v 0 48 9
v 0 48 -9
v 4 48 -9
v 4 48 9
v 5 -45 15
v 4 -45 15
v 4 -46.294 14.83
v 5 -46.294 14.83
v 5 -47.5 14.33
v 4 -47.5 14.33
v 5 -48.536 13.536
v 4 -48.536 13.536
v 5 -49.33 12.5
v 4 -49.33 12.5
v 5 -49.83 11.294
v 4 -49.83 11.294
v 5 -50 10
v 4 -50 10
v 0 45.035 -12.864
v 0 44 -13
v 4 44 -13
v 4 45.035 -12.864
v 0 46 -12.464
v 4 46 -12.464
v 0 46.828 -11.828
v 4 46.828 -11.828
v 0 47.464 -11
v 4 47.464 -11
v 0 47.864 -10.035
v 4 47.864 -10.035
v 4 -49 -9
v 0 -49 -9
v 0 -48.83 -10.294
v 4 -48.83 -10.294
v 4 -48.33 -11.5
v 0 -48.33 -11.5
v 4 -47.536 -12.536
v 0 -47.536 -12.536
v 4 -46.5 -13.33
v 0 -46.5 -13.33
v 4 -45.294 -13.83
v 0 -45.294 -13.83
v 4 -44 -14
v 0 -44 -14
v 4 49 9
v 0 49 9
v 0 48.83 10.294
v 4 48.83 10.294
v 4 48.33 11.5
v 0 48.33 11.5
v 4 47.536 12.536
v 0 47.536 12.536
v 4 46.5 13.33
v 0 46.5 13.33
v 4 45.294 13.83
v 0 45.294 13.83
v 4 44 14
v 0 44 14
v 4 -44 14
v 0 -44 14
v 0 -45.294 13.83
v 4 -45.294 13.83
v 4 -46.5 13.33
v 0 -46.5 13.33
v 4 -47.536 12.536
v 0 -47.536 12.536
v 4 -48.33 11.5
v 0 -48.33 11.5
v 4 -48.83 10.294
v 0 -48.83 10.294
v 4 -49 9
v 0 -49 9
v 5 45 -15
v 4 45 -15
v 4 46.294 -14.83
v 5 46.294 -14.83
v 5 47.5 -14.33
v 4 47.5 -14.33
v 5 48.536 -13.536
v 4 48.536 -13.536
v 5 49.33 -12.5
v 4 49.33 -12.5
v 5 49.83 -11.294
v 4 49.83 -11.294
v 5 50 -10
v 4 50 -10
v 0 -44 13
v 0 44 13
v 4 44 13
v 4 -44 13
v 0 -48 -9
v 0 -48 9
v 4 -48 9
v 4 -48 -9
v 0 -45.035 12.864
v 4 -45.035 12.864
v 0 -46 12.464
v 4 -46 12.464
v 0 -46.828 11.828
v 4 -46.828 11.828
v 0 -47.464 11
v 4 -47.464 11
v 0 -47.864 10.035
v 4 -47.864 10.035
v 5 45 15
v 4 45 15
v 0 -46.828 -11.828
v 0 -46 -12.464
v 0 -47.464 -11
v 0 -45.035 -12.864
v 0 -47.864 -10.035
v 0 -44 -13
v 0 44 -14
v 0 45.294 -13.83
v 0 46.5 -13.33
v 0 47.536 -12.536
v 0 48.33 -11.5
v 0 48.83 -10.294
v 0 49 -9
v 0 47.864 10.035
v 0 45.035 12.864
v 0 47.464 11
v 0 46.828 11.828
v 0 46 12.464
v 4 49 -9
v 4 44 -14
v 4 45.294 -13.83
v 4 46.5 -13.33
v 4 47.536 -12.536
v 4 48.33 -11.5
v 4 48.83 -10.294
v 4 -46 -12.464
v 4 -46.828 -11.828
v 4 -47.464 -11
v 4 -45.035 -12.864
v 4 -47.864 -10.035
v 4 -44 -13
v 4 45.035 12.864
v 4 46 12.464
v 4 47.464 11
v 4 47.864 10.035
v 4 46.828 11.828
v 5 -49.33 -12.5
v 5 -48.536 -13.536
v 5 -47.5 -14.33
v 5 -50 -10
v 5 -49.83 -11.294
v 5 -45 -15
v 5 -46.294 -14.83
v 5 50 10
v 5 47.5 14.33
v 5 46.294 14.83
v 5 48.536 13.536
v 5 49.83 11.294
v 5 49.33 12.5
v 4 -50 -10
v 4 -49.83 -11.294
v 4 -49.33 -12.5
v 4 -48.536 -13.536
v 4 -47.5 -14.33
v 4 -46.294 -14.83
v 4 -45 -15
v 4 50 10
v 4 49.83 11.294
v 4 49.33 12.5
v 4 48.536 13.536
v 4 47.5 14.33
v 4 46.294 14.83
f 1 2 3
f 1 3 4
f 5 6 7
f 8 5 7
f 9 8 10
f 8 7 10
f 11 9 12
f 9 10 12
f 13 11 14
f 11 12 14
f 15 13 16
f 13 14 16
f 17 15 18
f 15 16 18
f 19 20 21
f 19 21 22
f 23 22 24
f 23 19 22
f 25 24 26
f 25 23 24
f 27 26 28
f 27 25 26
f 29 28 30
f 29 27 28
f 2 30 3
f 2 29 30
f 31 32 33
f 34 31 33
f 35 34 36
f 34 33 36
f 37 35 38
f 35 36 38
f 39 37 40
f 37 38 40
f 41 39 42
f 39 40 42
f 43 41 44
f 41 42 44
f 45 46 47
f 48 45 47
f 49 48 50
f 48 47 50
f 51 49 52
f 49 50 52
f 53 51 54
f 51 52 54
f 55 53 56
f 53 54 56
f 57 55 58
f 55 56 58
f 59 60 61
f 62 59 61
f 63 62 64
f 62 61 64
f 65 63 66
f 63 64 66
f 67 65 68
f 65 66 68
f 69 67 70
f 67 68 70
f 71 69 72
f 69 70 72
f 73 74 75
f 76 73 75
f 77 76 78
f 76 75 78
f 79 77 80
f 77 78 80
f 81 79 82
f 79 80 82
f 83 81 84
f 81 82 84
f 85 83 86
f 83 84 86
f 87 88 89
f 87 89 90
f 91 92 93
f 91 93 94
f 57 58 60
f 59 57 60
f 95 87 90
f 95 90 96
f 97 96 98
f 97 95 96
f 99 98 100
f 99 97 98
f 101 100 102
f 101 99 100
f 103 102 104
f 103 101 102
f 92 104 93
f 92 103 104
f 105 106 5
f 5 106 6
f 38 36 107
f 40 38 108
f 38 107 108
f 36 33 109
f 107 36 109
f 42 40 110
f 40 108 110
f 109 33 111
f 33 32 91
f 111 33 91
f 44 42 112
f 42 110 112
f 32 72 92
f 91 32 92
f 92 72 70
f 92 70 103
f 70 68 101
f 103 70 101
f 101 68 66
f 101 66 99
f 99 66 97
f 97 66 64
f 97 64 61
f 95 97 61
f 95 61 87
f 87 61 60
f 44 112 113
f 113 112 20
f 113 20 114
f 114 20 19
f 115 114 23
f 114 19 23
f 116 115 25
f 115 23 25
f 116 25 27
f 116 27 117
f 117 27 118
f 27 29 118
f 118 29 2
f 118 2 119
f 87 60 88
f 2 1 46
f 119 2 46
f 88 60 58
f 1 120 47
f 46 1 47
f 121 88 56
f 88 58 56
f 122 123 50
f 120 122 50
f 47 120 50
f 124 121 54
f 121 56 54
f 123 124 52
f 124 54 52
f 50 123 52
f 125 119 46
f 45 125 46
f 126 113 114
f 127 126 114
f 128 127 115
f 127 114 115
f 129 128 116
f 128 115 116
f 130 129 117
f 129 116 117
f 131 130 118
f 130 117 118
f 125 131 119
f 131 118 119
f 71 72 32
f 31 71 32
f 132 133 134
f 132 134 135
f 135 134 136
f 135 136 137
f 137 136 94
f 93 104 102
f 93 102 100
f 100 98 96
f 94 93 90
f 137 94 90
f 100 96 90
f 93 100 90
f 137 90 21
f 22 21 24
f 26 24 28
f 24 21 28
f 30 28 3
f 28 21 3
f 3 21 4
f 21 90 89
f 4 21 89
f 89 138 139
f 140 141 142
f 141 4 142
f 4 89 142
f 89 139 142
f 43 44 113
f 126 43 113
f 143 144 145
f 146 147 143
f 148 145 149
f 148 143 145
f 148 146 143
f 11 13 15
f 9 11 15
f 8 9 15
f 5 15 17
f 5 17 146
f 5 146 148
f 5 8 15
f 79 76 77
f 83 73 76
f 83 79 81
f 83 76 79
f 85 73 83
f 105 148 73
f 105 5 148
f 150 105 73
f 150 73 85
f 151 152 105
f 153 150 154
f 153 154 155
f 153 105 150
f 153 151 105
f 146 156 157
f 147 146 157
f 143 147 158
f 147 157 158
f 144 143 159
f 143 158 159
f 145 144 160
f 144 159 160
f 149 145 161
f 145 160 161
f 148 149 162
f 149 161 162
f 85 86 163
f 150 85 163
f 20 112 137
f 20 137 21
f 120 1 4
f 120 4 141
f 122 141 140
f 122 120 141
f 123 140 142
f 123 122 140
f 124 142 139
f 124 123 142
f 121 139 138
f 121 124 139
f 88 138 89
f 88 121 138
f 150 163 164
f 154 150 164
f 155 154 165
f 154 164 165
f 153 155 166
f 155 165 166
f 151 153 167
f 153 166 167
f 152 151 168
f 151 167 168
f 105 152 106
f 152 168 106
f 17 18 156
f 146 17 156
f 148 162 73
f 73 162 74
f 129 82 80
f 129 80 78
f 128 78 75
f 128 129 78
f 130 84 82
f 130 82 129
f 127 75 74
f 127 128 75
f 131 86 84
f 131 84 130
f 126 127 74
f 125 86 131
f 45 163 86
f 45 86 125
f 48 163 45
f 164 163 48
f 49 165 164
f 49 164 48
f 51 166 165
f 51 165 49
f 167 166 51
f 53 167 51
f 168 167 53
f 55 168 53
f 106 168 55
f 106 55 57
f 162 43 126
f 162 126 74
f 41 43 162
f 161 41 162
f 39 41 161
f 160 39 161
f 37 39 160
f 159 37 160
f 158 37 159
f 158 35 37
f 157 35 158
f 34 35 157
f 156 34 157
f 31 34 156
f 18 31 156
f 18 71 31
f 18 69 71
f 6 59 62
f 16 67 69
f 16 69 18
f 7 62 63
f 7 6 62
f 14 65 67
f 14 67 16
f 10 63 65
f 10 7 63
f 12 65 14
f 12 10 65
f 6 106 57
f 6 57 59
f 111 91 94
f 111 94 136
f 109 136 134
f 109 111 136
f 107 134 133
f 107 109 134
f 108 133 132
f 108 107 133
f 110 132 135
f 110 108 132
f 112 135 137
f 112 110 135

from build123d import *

# Parameters (mm, degrees)
F1_DEPTH = 5
F3_DEPTH = 4
F4_T     = -1


with BuildPart() as f1:
    # F0 (on Right) → F1 (new body)
    with BuildSketch(Plane.YZ):
        with BuildLine():
            ThreePointArc((-50, -10), (-48.5355339059, -13.5355339059), (-45, -15))
            Line((-45, -15), (45, -15))
            ThreePointArc((45, -15), (48.5355339059, -13.5355339059), (50, -10))
            Line((50, -10), (50, 10))
            ThreePointArc((50, 10), (48.5355339059, 13.5355339059), (45, 15))
            Line((45, 15), (-45, 15))
            ThreePointArc((-45, 15), (-48.5355339059, 13.5355339059), (-50, 10))
            Line((-50, 10), (-50, -10))
        make_face()
    extrude(amount=F1_DEPTH)

    # F2 (on face) → F3 (cut)
    with BuildSketch(Plane(origin=(0, 0, 0), x_dir=(0, -1, 0), z_dir=(-1, 0, 0))):
        with BuildLine():
            Line((-45, -15), (45, -15))
            ThreePointArc((45, -15), (48.5355339059, -13.5355339059), (50, -10))
            Line((50, -10), (50, 10))
            ThreePointArc((50, 10), (48.5355339059, 13.5355339059), (45, 15))
            Line((45, 15), (-45, 15))
            ThreePointArc((-45, 15), (-48.5355339059, 13.5355339059), (-50, 10))
            Line((-50, 10), (-50, -10))
            ThreePointArc((-50, -10), (-48.5355339059, -13.5355339059), (-45, -15))
        make_face()
        with BuildLine():
            ThreePointArc((49, -9), (47.5355339059, -12.5355339059), (44, -14))
            Line((44, -14), (-44, -14))
            ThreePointArc((-44, -14), (-47.5355339059, -12.5355339059), (-49, -9))
            Line((-49, -9), (-49, 9))
            ThreePointArc((-49, 9), (-47.5355339059, 12.5355339059), (-44, 14))
            Line((-44, 14), (44, 14))
            ThreePointArc((44, 14), (47.5355339059, 12.5355339059), (49, 9))
            Line((49, 9), (49, -9))
        make_face(mode=Mode.SUBTRACT)
    extrude(amount=-F3_DEPTH, mode=Mode.SUBTRACT)

    # F4
    f4_openings = [f1.faces().sort_by_distance(p)[0] for p in [
        (0, 0, 0),
    ]]
    offset(amount=F4_T, openings=f4_openings, kind=Kind.INTERSECTION)


solid = f1.part
